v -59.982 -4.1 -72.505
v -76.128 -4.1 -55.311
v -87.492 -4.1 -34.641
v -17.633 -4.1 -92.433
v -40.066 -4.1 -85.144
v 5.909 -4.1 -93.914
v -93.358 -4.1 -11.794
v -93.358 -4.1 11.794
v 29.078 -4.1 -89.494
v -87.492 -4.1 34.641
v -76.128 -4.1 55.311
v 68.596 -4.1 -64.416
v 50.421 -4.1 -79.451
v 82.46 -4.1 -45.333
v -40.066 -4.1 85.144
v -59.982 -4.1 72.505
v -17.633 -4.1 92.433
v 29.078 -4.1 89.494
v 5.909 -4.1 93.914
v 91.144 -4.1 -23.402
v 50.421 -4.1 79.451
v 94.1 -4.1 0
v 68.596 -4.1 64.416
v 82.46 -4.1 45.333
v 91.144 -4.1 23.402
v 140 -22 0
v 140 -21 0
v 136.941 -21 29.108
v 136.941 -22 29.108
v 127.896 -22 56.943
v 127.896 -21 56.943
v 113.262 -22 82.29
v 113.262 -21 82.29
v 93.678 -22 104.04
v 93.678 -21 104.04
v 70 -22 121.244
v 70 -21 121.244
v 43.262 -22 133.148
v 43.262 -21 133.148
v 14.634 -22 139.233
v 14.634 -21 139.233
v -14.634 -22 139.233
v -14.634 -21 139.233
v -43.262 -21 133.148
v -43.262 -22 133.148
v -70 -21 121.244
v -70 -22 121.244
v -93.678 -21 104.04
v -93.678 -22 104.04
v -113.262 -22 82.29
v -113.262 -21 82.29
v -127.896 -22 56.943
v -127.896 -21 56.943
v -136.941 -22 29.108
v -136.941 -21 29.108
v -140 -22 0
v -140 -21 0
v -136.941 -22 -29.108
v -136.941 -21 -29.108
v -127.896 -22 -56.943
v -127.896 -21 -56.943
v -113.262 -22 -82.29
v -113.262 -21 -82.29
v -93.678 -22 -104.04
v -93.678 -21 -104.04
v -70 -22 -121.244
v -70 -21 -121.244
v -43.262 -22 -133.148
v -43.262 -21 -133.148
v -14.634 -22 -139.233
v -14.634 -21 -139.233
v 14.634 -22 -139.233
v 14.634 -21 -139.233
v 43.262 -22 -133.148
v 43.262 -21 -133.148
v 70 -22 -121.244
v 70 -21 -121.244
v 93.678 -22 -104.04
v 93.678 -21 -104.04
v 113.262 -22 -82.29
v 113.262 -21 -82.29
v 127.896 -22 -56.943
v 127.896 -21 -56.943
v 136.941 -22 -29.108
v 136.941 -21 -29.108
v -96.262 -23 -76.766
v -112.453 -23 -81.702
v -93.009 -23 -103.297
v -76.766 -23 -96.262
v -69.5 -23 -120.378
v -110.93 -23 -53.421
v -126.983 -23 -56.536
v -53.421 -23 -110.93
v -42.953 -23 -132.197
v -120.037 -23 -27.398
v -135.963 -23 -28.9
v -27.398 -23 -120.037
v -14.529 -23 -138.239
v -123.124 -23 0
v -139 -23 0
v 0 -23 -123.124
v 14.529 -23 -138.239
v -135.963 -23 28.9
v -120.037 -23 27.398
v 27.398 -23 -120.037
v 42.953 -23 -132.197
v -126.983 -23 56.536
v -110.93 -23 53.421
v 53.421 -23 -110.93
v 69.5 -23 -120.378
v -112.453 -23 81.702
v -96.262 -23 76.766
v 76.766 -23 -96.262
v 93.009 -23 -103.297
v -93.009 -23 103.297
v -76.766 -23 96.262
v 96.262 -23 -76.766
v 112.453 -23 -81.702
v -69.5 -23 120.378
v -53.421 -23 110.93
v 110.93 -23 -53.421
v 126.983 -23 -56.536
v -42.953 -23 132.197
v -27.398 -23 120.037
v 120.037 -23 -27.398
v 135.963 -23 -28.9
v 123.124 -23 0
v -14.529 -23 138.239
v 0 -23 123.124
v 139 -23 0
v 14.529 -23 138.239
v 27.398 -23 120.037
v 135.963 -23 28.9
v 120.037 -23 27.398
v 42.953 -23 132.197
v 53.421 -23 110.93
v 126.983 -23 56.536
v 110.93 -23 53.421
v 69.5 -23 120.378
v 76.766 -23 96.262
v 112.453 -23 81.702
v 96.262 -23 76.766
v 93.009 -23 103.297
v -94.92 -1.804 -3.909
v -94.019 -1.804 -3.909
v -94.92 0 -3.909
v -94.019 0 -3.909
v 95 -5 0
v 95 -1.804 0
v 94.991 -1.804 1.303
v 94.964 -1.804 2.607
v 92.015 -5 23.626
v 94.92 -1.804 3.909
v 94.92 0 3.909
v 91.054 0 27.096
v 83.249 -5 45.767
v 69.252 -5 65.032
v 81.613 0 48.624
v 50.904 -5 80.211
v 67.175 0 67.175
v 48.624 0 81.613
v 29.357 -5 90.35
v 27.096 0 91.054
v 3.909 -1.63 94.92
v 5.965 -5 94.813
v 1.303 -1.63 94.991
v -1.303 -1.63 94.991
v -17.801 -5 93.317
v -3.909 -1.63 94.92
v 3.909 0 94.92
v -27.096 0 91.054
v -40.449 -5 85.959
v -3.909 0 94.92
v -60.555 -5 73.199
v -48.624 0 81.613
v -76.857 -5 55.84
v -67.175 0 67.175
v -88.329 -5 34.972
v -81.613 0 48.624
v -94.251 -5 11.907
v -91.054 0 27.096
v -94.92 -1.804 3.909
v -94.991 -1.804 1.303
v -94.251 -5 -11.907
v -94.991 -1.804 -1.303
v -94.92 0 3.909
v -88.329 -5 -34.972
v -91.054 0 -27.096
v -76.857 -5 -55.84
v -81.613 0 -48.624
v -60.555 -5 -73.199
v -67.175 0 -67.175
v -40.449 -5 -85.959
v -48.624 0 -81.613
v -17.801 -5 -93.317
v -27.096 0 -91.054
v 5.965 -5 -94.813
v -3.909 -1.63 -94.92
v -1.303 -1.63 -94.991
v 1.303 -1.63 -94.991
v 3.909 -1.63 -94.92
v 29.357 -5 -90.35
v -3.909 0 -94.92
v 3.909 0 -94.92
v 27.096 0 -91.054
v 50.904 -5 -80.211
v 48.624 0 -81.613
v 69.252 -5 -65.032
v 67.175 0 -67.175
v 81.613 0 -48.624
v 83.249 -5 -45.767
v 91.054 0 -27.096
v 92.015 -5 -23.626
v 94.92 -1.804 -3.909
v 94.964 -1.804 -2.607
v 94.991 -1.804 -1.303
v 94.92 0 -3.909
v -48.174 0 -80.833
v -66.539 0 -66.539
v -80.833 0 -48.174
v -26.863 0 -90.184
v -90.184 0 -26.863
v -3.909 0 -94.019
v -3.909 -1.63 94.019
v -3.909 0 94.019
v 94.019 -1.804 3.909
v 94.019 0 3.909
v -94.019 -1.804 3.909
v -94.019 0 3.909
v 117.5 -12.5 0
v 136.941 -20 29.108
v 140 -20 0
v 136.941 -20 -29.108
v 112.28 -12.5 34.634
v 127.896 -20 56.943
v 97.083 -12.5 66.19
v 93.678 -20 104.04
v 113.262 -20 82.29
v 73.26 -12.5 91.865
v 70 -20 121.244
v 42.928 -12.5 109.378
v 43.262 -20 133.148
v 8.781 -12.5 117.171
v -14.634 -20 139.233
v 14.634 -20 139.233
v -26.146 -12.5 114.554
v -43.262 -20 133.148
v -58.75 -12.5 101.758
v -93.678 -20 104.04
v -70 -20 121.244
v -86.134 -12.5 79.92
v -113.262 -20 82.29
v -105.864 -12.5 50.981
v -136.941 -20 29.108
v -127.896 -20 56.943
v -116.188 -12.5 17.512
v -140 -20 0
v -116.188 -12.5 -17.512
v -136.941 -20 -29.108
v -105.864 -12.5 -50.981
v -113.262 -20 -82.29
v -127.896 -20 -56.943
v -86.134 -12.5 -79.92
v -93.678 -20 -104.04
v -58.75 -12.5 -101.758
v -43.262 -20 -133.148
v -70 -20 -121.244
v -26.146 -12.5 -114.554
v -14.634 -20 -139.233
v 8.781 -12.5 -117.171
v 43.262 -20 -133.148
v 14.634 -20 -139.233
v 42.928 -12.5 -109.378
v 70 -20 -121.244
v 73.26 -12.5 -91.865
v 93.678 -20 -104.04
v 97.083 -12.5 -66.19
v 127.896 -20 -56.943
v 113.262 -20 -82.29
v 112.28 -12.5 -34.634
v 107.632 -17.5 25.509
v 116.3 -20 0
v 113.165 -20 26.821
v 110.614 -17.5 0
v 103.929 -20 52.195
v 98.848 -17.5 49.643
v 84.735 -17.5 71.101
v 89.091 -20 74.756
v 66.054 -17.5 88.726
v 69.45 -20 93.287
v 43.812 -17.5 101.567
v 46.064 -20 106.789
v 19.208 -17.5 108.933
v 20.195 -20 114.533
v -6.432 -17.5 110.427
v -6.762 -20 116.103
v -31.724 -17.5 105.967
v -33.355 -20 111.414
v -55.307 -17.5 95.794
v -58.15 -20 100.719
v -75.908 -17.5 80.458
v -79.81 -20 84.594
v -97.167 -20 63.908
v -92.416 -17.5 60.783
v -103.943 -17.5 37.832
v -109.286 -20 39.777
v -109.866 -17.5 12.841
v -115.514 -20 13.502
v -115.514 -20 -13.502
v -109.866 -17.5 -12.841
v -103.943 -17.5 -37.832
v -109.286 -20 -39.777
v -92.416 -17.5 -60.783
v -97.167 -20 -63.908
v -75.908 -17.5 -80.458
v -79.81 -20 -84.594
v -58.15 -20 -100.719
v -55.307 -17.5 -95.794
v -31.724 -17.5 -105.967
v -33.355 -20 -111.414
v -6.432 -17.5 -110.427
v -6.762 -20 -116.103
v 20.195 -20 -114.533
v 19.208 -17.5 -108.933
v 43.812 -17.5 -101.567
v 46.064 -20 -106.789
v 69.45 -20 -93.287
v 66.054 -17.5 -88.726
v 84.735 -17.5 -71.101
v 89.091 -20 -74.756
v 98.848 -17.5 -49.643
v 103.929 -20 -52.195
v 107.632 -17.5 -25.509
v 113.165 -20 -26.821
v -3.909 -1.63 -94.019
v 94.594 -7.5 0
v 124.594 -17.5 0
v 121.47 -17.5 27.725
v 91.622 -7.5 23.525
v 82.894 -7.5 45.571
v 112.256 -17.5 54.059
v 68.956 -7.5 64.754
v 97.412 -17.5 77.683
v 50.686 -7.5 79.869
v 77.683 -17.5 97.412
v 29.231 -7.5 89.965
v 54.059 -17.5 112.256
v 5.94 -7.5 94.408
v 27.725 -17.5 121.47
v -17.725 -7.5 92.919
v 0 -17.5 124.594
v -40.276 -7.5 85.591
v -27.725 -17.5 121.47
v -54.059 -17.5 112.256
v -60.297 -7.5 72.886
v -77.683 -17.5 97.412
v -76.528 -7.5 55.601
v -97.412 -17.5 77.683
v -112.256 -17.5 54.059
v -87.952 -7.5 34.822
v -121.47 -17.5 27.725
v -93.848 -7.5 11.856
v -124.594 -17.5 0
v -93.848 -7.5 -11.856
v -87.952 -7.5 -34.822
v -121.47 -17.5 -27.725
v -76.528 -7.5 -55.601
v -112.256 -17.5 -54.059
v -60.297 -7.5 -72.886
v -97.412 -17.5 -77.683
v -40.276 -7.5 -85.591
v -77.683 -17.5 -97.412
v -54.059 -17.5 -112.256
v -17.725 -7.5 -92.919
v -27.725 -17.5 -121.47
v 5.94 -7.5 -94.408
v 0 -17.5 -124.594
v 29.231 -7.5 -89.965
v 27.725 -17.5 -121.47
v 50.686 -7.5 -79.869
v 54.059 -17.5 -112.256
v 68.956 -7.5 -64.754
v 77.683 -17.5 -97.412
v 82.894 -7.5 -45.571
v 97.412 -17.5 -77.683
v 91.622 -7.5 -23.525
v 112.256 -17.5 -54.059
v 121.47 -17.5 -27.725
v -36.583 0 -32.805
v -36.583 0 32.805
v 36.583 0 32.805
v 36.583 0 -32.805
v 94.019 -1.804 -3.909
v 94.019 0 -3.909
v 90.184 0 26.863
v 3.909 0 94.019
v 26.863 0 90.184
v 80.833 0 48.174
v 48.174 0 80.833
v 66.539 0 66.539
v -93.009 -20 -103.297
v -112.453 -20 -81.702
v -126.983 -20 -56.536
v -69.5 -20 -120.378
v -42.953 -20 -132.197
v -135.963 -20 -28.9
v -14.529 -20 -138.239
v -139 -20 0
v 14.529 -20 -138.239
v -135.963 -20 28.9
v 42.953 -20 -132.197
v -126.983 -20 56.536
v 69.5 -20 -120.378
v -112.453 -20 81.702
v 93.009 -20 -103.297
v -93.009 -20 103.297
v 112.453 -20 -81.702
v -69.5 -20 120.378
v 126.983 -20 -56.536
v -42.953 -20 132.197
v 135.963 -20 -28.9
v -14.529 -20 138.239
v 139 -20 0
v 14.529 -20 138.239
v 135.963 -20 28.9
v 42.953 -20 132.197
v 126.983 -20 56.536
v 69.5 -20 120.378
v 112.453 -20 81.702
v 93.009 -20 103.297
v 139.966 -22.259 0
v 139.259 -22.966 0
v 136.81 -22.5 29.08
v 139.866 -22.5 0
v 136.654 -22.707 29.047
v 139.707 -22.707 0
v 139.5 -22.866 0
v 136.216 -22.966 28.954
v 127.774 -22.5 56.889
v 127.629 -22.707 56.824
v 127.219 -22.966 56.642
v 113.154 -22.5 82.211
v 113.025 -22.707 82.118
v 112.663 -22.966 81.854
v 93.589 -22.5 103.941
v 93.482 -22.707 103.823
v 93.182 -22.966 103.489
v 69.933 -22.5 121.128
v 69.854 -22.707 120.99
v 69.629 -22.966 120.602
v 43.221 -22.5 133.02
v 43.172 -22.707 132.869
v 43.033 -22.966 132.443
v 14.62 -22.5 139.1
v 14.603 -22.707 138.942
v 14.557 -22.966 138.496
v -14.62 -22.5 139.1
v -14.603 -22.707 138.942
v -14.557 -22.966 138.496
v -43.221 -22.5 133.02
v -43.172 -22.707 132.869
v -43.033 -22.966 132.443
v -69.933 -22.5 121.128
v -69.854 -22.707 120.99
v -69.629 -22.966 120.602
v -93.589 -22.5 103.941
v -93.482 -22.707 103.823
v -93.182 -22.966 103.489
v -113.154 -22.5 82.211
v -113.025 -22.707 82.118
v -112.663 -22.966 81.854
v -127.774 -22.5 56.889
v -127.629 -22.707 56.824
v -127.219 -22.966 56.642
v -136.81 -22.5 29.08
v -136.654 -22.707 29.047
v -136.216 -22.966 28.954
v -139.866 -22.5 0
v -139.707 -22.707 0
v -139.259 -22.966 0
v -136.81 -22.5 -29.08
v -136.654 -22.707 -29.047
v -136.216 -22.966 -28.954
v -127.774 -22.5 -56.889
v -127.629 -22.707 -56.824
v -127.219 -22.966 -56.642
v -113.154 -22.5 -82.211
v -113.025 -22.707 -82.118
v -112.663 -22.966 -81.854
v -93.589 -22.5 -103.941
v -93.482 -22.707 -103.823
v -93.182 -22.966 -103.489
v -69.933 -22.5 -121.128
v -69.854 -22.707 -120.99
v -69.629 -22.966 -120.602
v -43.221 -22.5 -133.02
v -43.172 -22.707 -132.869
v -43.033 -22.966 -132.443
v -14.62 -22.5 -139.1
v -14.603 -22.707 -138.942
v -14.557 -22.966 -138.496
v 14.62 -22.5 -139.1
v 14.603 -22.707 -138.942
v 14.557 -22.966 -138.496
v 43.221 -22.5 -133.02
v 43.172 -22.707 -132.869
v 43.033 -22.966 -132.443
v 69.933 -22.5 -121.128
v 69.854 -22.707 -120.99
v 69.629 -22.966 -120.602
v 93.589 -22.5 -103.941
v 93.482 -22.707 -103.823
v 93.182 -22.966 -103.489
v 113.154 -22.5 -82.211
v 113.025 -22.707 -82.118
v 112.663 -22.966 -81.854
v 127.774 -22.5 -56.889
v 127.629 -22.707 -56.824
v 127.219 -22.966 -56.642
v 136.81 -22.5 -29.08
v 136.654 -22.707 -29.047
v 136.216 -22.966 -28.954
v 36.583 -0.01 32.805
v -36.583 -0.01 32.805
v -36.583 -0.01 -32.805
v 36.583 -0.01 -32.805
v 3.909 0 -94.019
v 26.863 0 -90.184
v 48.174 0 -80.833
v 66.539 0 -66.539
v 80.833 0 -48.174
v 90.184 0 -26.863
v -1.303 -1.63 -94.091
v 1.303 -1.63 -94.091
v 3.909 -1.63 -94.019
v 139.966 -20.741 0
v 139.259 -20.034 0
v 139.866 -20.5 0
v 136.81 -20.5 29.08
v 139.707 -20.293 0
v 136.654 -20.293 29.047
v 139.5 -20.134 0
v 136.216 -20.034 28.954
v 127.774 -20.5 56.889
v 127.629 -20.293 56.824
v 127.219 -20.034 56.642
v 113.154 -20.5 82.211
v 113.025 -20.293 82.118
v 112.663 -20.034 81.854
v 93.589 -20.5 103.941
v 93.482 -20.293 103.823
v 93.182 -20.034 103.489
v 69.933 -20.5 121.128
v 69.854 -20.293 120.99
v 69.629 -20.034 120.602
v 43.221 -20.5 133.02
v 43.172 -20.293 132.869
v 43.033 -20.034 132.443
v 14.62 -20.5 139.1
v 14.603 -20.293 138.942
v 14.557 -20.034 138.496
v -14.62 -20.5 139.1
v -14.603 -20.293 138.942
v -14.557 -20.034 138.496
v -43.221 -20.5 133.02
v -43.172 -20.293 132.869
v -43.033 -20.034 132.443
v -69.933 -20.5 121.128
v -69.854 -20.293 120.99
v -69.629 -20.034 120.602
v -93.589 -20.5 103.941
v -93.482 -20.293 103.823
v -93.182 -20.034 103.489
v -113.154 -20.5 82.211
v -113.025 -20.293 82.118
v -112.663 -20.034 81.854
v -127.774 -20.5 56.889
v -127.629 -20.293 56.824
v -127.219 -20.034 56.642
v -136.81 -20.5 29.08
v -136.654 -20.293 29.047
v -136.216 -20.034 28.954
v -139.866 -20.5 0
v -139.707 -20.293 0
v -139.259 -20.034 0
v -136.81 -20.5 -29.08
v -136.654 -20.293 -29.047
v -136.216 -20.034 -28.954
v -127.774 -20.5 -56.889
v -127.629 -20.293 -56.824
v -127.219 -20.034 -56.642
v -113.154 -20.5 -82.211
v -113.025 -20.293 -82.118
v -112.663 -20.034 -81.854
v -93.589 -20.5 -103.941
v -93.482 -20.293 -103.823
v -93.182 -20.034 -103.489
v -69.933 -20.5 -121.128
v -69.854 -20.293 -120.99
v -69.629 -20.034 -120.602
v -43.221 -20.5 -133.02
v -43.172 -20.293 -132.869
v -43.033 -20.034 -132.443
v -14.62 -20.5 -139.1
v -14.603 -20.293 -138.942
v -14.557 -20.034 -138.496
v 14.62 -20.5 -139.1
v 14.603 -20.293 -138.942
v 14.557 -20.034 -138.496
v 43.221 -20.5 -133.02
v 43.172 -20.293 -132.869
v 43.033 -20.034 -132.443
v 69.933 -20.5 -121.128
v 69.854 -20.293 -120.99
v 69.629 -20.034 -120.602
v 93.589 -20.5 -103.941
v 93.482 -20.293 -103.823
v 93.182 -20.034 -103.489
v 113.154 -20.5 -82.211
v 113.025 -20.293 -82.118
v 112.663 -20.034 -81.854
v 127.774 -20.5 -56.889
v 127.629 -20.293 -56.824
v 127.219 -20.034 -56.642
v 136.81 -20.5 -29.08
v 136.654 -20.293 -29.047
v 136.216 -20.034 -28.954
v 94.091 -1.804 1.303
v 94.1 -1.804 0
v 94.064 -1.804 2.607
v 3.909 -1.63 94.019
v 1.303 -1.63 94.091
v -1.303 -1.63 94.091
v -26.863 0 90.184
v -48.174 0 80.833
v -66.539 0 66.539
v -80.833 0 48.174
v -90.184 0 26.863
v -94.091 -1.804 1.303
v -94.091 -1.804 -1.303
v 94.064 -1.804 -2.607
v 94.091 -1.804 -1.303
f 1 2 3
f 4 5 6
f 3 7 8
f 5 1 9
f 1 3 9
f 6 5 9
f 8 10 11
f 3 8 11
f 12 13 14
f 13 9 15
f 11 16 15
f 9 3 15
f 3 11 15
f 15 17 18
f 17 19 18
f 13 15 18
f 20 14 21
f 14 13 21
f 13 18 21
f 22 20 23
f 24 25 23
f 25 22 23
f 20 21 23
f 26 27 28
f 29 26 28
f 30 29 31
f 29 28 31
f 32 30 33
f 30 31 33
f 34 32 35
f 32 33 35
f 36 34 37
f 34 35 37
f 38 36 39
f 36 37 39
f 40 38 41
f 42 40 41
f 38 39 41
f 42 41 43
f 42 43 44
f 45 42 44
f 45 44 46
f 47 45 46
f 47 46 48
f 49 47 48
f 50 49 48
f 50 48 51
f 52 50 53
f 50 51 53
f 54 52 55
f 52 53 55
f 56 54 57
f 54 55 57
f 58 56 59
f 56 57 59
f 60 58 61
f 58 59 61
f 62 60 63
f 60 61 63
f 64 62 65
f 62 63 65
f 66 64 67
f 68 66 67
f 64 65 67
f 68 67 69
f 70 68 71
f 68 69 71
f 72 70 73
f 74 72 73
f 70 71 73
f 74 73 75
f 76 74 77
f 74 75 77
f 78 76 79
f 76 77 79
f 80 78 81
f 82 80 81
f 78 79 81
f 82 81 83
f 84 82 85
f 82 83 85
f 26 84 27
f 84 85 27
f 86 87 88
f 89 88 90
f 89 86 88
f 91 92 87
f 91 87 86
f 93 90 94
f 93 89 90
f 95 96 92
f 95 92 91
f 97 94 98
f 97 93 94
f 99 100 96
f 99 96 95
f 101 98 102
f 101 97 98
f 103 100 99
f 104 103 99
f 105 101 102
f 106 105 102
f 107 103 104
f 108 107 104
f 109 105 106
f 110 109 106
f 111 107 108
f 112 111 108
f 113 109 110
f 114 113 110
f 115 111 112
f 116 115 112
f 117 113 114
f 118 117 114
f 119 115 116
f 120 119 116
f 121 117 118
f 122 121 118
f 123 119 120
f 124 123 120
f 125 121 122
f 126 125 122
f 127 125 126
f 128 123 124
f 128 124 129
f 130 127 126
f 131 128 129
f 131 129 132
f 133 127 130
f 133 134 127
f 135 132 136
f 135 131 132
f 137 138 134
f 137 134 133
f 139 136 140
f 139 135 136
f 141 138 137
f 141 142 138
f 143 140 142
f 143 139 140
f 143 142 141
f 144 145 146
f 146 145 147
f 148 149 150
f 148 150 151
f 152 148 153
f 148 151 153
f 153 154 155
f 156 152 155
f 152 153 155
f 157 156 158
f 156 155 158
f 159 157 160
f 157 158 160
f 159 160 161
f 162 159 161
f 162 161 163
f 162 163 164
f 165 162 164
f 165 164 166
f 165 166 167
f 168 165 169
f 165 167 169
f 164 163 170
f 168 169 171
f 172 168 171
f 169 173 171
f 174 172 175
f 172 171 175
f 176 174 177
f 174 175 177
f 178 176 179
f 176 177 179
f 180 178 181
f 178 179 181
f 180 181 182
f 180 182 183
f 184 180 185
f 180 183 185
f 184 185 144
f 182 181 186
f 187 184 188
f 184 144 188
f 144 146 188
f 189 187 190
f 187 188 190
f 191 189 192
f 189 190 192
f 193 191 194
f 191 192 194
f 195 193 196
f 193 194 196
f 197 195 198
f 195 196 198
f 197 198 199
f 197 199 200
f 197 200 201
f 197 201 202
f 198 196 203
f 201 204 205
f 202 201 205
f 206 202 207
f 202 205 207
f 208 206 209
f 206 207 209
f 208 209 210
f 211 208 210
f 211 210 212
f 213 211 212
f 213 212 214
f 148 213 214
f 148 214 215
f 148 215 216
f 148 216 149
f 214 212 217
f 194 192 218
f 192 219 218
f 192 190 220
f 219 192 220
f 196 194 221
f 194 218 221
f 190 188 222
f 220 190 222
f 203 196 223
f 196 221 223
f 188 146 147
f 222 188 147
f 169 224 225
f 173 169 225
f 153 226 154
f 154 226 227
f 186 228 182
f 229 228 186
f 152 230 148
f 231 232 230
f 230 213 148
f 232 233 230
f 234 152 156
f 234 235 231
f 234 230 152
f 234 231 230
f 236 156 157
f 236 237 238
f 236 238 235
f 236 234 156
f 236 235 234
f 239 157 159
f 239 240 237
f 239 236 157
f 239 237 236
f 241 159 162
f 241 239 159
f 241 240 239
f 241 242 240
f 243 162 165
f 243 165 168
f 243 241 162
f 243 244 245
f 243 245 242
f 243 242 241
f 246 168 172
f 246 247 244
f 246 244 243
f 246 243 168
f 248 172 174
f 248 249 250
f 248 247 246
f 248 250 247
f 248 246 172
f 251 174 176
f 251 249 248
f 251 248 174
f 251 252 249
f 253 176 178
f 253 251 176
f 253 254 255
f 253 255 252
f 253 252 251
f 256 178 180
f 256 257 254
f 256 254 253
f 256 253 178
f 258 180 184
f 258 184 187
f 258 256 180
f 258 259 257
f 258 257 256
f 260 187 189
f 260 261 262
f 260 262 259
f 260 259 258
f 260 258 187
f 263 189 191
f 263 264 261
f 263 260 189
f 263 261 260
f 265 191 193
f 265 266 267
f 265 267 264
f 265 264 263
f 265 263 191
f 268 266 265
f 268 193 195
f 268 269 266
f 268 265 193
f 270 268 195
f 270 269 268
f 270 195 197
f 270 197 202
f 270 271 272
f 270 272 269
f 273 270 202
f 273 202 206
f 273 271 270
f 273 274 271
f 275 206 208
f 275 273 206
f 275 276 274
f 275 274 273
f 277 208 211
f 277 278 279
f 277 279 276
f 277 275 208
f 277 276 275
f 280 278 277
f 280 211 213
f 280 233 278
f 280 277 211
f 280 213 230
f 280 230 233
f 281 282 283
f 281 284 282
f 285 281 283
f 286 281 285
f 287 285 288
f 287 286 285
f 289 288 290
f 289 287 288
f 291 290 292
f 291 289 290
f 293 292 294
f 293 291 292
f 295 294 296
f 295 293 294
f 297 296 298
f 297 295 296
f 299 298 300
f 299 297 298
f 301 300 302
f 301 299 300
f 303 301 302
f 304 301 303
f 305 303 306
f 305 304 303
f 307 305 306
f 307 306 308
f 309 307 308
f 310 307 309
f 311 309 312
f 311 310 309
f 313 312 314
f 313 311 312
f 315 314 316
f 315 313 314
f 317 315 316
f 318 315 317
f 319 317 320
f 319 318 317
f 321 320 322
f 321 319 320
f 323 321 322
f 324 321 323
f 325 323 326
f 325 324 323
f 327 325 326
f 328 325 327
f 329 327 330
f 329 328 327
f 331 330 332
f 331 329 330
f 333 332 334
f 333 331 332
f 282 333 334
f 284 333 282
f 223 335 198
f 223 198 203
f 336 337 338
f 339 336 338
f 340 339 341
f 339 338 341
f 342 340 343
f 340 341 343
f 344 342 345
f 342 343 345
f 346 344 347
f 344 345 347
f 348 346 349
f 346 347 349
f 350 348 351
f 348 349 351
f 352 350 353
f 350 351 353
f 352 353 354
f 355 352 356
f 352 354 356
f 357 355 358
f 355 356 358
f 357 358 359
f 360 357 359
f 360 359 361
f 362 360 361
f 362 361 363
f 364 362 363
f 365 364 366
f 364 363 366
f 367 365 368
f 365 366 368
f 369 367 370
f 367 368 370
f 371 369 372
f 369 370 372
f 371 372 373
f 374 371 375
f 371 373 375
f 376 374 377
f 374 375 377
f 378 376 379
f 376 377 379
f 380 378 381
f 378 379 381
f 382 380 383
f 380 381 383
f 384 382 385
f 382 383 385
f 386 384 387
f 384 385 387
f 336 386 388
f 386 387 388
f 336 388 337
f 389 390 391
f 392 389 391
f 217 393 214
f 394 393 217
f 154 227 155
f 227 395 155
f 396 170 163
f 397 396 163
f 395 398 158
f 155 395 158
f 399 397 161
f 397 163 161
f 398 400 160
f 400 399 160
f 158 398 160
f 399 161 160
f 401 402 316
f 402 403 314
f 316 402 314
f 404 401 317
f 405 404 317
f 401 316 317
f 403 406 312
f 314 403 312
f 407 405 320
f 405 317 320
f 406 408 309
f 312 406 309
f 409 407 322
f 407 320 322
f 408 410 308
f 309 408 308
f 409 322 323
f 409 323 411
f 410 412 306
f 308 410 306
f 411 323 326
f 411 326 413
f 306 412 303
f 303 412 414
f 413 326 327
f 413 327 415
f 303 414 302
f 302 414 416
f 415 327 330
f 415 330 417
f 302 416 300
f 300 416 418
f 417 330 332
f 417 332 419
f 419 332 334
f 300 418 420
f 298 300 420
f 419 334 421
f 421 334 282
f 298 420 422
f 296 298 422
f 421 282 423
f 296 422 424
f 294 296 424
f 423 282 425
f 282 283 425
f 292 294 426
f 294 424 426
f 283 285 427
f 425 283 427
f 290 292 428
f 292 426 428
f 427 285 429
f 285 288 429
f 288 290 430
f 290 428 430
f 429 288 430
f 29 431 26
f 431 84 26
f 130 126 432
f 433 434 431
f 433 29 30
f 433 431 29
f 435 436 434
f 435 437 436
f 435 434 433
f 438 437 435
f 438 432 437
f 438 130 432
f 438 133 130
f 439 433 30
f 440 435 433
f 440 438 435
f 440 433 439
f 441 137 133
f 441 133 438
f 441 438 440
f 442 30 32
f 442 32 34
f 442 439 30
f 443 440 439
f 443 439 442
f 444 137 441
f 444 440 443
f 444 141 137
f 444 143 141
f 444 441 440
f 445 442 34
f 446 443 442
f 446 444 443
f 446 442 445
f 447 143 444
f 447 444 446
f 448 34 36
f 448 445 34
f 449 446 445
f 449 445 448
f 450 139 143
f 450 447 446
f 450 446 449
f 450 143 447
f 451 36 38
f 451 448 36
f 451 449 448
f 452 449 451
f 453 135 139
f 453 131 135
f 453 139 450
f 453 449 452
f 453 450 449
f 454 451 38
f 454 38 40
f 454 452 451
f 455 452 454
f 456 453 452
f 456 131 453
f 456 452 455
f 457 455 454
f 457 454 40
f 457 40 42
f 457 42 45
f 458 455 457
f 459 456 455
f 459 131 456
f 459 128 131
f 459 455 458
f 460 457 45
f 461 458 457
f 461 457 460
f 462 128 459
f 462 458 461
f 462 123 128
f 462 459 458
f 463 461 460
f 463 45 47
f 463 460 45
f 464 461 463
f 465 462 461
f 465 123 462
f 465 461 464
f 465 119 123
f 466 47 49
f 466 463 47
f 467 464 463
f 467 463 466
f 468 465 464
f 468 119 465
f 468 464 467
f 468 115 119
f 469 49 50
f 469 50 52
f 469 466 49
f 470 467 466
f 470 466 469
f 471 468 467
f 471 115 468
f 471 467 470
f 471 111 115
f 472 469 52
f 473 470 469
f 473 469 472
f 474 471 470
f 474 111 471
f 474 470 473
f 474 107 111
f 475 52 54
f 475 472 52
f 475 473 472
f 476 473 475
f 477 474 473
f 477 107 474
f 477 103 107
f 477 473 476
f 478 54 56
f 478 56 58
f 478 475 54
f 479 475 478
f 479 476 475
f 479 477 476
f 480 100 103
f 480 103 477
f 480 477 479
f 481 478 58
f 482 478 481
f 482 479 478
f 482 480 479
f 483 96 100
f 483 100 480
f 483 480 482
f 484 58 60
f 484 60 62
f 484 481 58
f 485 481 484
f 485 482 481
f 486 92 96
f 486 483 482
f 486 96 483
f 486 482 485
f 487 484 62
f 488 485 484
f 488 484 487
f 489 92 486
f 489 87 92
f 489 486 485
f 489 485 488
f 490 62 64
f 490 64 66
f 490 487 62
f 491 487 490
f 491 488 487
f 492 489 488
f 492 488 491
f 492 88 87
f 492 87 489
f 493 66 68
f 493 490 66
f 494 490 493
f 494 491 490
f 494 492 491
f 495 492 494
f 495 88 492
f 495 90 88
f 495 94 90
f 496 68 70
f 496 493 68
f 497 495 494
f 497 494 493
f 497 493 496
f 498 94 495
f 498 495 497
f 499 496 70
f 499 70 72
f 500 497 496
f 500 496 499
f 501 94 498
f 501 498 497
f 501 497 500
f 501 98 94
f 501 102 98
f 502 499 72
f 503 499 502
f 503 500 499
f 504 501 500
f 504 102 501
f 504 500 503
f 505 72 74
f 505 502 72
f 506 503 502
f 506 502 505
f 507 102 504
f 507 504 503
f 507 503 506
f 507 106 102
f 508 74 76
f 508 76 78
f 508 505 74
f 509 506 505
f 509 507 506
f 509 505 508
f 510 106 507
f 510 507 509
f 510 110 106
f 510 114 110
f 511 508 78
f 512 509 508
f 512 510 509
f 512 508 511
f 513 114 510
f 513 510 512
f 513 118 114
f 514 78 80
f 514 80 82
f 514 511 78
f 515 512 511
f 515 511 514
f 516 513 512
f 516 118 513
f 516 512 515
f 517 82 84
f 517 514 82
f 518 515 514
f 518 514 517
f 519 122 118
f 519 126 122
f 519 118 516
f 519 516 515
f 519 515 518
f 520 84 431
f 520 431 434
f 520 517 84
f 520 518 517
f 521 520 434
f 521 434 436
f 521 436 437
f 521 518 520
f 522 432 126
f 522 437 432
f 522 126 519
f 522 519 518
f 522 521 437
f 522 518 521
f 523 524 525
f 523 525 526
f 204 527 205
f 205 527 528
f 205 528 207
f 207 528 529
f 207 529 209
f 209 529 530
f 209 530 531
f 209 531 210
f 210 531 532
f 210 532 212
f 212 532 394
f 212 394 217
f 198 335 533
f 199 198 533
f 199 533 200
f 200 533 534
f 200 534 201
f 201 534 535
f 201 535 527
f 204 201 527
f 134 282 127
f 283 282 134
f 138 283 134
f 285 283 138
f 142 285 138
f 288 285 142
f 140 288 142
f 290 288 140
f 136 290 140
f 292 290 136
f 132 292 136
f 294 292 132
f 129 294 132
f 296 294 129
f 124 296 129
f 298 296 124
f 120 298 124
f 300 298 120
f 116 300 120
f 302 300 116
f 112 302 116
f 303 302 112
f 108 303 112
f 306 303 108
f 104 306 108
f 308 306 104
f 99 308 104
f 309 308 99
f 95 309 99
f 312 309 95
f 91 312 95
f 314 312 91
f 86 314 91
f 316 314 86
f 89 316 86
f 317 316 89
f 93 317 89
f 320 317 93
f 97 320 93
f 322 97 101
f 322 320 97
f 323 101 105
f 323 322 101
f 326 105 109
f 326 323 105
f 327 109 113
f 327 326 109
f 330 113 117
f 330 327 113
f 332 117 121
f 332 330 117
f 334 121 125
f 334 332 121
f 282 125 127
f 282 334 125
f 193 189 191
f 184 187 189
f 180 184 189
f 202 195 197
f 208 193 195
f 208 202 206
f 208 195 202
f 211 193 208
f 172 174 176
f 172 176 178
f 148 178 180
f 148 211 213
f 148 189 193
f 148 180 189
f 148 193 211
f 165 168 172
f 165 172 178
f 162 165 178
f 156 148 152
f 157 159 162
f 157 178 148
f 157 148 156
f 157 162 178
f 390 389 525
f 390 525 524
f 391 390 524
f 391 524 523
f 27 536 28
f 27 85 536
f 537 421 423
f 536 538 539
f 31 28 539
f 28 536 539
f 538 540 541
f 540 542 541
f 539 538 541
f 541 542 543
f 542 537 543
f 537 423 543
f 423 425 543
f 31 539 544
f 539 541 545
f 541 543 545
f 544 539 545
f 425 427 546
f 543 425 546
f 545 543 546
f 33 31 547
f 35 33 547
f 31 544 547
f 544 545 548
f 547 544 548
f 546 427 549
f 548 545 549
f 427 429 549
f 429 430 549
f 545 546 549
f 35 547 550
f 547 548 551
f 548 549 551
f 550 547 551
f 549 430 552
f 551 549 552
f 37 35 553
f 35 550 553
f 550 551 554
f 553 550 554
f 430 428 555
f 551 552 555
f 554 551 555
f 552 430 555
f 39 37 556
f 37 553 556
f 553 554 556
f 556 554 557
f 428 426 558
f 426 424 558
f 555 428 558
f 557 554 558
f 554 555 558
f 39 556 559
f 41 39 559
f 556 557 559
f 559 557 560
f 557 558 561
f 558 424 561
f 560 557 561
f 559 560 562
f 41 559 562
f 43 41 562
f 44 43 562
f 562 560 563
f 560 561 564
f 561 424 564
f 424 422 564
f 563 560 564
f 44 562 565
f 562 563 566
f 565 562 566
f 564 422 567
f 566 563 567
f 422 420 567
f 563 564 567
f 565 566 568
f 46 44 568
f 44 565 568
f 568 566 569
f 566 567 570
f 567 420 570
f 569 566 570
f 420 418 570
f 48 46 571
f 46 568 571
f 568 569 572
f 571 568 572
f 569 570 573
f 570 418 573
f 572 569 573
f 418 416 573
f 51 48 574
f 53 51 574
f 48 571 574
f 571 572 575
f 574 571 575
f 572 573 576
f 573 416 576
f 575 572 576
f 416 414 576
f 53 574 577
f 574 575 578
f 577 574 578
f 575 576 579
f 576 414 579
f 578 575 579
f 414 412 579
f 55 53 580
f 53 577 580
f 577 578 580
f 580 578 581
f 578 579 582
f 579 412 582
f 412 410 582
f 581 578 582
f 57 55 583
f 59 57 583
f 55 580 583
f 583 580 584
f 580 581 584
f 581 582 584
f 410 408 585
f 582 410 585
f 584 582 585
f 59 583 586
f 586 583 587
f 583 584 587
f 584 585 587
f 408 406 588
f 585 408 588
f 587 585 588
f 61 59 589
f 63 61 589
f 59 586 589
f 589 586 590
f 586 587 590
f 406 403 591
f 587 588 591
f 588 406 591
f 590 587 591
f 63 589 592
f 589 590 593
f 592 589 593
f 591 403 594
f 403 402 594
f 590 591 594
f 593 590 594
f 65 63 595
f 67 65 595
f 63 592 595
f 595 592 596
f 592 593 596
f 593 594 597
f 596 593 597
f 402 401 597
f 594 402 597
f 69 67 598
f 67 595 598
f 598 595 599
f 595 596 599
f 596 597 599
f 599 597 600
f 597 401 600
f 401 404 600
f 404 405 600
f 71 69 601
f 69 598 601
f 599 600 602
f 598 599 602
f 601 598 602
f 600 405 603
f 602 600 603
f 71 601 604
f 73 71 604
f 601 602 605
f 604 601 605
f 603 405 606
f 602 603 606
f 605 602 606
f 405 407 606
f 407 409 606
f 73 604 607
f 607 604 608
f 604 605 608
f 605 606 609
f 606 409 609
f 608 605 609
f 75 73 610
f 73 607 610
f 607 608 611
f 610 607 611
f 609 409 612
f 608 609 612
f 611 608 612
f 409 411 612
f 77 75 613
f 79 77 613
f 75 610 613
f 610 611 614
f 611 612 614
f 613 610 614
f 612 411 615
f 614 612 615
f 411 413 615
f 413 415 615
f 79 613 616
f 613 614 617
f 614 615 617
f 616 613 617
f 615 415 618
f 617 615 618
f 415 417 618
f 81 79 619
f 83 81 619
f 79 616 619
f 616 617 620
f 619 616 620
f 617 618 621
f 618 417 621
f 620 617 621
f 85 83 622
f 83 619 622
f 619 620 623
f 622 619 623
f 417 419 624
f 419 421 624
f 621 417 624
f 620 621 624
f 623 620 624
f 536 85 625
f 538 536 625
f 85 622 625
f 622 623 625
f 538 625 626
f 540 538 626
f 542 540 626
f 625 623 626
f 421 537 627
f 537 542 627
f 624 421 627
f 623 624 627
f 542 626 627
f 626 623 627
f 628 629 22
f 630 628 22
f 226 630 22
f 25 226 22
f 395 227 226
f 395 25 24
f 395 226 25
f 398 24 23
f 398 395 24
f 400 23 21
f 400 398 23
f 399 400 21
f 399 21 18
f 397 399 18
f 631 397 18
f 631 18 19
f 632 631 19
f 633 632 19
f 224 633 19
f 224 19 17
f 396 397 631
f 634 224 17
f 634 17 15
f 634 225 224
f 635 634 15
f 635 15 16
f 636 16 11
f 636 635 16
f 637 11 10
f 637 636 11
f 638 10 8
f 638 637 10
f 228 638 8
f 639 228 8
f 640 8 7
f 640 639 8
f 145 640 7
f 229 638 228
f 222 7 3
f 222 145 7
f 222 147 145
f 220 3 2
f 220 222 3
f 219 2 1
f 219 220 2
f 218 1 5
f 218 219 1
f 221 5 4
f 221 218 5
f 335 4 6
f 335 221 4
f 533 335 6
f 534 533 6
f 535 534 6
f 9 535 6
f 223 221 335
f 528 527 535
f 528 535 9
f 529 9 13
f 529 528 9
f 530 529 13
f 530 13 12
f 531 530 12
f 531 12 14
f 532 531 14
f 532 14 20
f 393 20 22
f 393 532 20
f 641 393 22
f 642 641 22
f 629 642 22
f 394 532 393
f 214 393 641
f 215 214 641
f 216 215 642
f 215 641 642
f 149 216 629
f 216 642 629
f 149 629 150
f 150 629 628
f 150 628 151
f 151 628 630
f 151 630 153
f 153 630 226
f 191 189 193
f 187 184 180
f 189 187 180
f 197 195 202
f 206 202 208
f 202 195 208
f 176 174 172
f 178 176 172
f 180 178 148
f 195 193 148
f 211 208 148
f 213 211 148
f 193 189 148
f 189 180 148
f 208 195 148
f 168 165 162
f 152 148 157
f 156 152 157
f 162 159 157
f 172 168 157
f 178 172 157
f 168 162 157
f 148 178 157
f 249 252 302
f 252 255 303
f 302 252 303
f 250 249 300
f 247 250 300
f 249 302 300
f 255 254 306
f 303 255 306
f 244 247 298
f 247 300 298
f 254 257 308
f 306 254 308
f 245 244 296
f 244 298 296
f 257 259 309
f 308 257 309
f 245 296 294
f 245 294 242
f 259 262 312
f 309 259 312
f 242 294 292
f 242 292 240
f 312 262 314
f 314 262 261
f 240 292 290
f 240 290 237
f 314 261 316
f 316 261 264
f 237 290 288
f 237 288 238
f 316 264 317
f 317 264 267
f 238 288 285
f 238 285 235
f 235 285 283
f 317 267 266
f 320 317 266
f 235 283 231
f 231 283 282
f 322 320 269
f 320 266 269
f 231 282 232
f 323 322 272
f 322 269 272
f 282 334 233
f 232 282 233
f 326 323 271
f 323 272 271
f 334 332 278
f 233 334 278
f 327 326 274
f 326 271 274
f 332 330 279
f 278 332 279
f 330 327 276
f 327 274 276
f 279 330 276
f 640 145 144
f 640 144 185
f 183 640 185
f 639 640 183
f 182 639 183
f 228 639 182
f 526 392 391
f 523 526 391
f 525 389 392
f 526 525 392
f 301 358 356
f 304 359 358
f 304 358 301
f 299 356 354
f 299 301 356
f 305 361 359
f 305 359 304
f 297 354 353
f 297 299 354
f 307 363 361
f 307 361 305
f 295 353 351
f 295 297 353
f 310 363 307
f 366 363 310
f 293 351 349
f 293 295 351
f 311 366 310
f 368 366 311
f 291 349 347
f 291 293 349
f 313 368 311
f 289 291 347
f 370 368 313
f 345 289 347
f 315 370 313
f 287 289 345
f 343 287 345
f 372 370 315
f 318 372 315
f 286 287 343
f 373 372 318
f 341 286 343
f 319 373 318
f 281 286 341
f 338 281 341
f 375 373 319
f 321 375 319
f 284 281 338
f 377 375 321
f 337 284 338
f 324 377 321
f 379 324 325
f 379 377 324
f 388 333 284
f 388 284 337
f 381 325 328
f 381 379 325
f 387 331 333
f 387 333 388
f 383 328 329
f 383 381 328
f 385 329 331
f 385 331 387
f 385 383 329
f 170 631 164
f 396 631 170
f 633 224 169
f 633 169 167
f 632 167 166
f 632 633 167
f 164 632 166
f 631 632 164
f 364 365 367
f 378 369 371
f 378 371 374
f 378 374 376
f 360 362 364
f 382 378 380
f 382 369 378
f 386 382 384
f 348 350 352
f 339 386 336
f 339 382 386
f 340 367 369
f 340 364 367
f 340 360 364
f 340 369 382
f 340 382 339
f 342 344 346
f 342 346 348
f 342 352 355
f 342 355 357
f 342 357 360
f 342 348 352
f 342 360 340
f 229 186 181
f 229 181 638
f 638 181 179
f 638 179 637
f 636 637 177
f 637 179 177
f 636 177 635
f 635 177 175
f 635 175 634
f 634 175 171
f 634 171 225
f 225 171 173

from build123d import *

# Parameters (mm, degrees)
F0_R           = 95
F1_DEPTH       = 5
F2_T           = -0.9
F4_R           = 140
F5_DEPTH       = 3
F1_FACE_R      = 95
F5_FACE_R      = 140
F8_R           = 1
F9_T           = -2.5
F10_W          = 7.818793878
F10_H          = 3.2596825622
F11_DEPTH      = 109.4
F11_DEPTH_BACK = 153.9
F12_W          = 3.6079295565
F12_H          = 7.81879
F13_DEPTH      = 116
F13_DEPTH_BACK = 123
F14_W          = 73.1657221913
F14_H          = 65.6104907393
F15_DEPTH      = 0.01


# Not quite as in the source:
# - a feature of the source that left no trace in its solid (it failed there, or was rolled back) is left out


with BuildPart() as f1:
    # F0 (on Front) → F1 (new body)
    with BuildSketch(Plane.XZ):
        Circle(F0_R)
    extrude(amount=F1_DEPTH)

    # F2
    f2_openings = [f1.faces().sort_by_distance(p)[0] for p in [
        (0, 0, 0),
    ]]
    offset(amount=F2_T, openings=f2_openings)

    # F10 (on Top) → F11 (cut, two sides)
    with BuildSketch(Plane.XY) as f11_sk:
        Rectangle(F10_W, F10_H)
    extrude(amount=-F11_DEPTH, mode=Mode.SUBTRACT)
    extrude(f11_sk.sketch, amount=F11_DEPTH_BACK, mode=Mode.SUBTRACT)

    # F12 (on Right) → F13 (cut, two sides)
    with BuildSketch(Plane.YZ) as f13_sk:
        Rectangle(F12_W, F12_H)
    extrude(amount=-F13_DEPTH, mode=Mode.SUBTRACT)
    extrude(f13_sk.sketch, amount=F13_DEPTH_BACK, mode=Mode.SUBTRACT)


with BuildPart() as f5:
    # F4 (on offset) → F5 (new body)
    with BuildSketch(Plane.XZ.offset(20)):
        Circle(F4_R)
    extrude(amount=F5_DEPTH)

    # F8
    f8_edges = [f5.edges().sort_by_distance(p)[0] for p in [
        (-140, -20, 0),
        (-140, -23, 0),
    ]]
    fillet(f8_edges, radius=F8_R)


with BuildPart() as f6:
    # F1_face (on face) → F6 section 0
    with BuildSketch(Plane.XZ.offset(5)):
        Circle(F1_FACE_R)
    # F5_face (on face) → F6 section 1
    with BuildSketch(Plane(origin=(0, -20, 0), x_dir=(1, 0, 0), z_dir=(0, 1, 0))):
        Circle(F5_FACE_R)
    loft()

    # F9 (hollow: no face is removed)
    offset(amount=F9_T, mode=Mode.SUBTRACT)


with BuildPart() as f15:
    # F14 (on Front) → F15 (new body)
    with BuildSketch(Plane.XZ):
        Rectangle(F14_W, F14_H)
    extrude(amount=F15_DEPTH)


with BuildPart() as f17_tool:
    # F16 (on Top) → F17 (revolve)
    with BuildSketch(Plane.XY):
        Polygon((93.0999964476, -9.8000001162), (0, -9.8000001162), (0, -30.2647054195), (126.5352964401, -24.4999993593), align=None)
    revolve(axis=Axis((0, -20.0323527679, 0), (0, -1, 0)))


with BuildPart() as f5_1:
    add(f5.part)

    # F17: cut by f17_tool
    add(f17_tool.part, mode=Mode.SUBTRACT)


with BuildPart() as f6_1:
    add(f6.part)

    # F17: cut by f17_tool
    add(f17_tool.part, mode=Mode.SUBTRACT)


solid = Compound([f1.part, f15.part, f5_1.part, f6_1.part])
